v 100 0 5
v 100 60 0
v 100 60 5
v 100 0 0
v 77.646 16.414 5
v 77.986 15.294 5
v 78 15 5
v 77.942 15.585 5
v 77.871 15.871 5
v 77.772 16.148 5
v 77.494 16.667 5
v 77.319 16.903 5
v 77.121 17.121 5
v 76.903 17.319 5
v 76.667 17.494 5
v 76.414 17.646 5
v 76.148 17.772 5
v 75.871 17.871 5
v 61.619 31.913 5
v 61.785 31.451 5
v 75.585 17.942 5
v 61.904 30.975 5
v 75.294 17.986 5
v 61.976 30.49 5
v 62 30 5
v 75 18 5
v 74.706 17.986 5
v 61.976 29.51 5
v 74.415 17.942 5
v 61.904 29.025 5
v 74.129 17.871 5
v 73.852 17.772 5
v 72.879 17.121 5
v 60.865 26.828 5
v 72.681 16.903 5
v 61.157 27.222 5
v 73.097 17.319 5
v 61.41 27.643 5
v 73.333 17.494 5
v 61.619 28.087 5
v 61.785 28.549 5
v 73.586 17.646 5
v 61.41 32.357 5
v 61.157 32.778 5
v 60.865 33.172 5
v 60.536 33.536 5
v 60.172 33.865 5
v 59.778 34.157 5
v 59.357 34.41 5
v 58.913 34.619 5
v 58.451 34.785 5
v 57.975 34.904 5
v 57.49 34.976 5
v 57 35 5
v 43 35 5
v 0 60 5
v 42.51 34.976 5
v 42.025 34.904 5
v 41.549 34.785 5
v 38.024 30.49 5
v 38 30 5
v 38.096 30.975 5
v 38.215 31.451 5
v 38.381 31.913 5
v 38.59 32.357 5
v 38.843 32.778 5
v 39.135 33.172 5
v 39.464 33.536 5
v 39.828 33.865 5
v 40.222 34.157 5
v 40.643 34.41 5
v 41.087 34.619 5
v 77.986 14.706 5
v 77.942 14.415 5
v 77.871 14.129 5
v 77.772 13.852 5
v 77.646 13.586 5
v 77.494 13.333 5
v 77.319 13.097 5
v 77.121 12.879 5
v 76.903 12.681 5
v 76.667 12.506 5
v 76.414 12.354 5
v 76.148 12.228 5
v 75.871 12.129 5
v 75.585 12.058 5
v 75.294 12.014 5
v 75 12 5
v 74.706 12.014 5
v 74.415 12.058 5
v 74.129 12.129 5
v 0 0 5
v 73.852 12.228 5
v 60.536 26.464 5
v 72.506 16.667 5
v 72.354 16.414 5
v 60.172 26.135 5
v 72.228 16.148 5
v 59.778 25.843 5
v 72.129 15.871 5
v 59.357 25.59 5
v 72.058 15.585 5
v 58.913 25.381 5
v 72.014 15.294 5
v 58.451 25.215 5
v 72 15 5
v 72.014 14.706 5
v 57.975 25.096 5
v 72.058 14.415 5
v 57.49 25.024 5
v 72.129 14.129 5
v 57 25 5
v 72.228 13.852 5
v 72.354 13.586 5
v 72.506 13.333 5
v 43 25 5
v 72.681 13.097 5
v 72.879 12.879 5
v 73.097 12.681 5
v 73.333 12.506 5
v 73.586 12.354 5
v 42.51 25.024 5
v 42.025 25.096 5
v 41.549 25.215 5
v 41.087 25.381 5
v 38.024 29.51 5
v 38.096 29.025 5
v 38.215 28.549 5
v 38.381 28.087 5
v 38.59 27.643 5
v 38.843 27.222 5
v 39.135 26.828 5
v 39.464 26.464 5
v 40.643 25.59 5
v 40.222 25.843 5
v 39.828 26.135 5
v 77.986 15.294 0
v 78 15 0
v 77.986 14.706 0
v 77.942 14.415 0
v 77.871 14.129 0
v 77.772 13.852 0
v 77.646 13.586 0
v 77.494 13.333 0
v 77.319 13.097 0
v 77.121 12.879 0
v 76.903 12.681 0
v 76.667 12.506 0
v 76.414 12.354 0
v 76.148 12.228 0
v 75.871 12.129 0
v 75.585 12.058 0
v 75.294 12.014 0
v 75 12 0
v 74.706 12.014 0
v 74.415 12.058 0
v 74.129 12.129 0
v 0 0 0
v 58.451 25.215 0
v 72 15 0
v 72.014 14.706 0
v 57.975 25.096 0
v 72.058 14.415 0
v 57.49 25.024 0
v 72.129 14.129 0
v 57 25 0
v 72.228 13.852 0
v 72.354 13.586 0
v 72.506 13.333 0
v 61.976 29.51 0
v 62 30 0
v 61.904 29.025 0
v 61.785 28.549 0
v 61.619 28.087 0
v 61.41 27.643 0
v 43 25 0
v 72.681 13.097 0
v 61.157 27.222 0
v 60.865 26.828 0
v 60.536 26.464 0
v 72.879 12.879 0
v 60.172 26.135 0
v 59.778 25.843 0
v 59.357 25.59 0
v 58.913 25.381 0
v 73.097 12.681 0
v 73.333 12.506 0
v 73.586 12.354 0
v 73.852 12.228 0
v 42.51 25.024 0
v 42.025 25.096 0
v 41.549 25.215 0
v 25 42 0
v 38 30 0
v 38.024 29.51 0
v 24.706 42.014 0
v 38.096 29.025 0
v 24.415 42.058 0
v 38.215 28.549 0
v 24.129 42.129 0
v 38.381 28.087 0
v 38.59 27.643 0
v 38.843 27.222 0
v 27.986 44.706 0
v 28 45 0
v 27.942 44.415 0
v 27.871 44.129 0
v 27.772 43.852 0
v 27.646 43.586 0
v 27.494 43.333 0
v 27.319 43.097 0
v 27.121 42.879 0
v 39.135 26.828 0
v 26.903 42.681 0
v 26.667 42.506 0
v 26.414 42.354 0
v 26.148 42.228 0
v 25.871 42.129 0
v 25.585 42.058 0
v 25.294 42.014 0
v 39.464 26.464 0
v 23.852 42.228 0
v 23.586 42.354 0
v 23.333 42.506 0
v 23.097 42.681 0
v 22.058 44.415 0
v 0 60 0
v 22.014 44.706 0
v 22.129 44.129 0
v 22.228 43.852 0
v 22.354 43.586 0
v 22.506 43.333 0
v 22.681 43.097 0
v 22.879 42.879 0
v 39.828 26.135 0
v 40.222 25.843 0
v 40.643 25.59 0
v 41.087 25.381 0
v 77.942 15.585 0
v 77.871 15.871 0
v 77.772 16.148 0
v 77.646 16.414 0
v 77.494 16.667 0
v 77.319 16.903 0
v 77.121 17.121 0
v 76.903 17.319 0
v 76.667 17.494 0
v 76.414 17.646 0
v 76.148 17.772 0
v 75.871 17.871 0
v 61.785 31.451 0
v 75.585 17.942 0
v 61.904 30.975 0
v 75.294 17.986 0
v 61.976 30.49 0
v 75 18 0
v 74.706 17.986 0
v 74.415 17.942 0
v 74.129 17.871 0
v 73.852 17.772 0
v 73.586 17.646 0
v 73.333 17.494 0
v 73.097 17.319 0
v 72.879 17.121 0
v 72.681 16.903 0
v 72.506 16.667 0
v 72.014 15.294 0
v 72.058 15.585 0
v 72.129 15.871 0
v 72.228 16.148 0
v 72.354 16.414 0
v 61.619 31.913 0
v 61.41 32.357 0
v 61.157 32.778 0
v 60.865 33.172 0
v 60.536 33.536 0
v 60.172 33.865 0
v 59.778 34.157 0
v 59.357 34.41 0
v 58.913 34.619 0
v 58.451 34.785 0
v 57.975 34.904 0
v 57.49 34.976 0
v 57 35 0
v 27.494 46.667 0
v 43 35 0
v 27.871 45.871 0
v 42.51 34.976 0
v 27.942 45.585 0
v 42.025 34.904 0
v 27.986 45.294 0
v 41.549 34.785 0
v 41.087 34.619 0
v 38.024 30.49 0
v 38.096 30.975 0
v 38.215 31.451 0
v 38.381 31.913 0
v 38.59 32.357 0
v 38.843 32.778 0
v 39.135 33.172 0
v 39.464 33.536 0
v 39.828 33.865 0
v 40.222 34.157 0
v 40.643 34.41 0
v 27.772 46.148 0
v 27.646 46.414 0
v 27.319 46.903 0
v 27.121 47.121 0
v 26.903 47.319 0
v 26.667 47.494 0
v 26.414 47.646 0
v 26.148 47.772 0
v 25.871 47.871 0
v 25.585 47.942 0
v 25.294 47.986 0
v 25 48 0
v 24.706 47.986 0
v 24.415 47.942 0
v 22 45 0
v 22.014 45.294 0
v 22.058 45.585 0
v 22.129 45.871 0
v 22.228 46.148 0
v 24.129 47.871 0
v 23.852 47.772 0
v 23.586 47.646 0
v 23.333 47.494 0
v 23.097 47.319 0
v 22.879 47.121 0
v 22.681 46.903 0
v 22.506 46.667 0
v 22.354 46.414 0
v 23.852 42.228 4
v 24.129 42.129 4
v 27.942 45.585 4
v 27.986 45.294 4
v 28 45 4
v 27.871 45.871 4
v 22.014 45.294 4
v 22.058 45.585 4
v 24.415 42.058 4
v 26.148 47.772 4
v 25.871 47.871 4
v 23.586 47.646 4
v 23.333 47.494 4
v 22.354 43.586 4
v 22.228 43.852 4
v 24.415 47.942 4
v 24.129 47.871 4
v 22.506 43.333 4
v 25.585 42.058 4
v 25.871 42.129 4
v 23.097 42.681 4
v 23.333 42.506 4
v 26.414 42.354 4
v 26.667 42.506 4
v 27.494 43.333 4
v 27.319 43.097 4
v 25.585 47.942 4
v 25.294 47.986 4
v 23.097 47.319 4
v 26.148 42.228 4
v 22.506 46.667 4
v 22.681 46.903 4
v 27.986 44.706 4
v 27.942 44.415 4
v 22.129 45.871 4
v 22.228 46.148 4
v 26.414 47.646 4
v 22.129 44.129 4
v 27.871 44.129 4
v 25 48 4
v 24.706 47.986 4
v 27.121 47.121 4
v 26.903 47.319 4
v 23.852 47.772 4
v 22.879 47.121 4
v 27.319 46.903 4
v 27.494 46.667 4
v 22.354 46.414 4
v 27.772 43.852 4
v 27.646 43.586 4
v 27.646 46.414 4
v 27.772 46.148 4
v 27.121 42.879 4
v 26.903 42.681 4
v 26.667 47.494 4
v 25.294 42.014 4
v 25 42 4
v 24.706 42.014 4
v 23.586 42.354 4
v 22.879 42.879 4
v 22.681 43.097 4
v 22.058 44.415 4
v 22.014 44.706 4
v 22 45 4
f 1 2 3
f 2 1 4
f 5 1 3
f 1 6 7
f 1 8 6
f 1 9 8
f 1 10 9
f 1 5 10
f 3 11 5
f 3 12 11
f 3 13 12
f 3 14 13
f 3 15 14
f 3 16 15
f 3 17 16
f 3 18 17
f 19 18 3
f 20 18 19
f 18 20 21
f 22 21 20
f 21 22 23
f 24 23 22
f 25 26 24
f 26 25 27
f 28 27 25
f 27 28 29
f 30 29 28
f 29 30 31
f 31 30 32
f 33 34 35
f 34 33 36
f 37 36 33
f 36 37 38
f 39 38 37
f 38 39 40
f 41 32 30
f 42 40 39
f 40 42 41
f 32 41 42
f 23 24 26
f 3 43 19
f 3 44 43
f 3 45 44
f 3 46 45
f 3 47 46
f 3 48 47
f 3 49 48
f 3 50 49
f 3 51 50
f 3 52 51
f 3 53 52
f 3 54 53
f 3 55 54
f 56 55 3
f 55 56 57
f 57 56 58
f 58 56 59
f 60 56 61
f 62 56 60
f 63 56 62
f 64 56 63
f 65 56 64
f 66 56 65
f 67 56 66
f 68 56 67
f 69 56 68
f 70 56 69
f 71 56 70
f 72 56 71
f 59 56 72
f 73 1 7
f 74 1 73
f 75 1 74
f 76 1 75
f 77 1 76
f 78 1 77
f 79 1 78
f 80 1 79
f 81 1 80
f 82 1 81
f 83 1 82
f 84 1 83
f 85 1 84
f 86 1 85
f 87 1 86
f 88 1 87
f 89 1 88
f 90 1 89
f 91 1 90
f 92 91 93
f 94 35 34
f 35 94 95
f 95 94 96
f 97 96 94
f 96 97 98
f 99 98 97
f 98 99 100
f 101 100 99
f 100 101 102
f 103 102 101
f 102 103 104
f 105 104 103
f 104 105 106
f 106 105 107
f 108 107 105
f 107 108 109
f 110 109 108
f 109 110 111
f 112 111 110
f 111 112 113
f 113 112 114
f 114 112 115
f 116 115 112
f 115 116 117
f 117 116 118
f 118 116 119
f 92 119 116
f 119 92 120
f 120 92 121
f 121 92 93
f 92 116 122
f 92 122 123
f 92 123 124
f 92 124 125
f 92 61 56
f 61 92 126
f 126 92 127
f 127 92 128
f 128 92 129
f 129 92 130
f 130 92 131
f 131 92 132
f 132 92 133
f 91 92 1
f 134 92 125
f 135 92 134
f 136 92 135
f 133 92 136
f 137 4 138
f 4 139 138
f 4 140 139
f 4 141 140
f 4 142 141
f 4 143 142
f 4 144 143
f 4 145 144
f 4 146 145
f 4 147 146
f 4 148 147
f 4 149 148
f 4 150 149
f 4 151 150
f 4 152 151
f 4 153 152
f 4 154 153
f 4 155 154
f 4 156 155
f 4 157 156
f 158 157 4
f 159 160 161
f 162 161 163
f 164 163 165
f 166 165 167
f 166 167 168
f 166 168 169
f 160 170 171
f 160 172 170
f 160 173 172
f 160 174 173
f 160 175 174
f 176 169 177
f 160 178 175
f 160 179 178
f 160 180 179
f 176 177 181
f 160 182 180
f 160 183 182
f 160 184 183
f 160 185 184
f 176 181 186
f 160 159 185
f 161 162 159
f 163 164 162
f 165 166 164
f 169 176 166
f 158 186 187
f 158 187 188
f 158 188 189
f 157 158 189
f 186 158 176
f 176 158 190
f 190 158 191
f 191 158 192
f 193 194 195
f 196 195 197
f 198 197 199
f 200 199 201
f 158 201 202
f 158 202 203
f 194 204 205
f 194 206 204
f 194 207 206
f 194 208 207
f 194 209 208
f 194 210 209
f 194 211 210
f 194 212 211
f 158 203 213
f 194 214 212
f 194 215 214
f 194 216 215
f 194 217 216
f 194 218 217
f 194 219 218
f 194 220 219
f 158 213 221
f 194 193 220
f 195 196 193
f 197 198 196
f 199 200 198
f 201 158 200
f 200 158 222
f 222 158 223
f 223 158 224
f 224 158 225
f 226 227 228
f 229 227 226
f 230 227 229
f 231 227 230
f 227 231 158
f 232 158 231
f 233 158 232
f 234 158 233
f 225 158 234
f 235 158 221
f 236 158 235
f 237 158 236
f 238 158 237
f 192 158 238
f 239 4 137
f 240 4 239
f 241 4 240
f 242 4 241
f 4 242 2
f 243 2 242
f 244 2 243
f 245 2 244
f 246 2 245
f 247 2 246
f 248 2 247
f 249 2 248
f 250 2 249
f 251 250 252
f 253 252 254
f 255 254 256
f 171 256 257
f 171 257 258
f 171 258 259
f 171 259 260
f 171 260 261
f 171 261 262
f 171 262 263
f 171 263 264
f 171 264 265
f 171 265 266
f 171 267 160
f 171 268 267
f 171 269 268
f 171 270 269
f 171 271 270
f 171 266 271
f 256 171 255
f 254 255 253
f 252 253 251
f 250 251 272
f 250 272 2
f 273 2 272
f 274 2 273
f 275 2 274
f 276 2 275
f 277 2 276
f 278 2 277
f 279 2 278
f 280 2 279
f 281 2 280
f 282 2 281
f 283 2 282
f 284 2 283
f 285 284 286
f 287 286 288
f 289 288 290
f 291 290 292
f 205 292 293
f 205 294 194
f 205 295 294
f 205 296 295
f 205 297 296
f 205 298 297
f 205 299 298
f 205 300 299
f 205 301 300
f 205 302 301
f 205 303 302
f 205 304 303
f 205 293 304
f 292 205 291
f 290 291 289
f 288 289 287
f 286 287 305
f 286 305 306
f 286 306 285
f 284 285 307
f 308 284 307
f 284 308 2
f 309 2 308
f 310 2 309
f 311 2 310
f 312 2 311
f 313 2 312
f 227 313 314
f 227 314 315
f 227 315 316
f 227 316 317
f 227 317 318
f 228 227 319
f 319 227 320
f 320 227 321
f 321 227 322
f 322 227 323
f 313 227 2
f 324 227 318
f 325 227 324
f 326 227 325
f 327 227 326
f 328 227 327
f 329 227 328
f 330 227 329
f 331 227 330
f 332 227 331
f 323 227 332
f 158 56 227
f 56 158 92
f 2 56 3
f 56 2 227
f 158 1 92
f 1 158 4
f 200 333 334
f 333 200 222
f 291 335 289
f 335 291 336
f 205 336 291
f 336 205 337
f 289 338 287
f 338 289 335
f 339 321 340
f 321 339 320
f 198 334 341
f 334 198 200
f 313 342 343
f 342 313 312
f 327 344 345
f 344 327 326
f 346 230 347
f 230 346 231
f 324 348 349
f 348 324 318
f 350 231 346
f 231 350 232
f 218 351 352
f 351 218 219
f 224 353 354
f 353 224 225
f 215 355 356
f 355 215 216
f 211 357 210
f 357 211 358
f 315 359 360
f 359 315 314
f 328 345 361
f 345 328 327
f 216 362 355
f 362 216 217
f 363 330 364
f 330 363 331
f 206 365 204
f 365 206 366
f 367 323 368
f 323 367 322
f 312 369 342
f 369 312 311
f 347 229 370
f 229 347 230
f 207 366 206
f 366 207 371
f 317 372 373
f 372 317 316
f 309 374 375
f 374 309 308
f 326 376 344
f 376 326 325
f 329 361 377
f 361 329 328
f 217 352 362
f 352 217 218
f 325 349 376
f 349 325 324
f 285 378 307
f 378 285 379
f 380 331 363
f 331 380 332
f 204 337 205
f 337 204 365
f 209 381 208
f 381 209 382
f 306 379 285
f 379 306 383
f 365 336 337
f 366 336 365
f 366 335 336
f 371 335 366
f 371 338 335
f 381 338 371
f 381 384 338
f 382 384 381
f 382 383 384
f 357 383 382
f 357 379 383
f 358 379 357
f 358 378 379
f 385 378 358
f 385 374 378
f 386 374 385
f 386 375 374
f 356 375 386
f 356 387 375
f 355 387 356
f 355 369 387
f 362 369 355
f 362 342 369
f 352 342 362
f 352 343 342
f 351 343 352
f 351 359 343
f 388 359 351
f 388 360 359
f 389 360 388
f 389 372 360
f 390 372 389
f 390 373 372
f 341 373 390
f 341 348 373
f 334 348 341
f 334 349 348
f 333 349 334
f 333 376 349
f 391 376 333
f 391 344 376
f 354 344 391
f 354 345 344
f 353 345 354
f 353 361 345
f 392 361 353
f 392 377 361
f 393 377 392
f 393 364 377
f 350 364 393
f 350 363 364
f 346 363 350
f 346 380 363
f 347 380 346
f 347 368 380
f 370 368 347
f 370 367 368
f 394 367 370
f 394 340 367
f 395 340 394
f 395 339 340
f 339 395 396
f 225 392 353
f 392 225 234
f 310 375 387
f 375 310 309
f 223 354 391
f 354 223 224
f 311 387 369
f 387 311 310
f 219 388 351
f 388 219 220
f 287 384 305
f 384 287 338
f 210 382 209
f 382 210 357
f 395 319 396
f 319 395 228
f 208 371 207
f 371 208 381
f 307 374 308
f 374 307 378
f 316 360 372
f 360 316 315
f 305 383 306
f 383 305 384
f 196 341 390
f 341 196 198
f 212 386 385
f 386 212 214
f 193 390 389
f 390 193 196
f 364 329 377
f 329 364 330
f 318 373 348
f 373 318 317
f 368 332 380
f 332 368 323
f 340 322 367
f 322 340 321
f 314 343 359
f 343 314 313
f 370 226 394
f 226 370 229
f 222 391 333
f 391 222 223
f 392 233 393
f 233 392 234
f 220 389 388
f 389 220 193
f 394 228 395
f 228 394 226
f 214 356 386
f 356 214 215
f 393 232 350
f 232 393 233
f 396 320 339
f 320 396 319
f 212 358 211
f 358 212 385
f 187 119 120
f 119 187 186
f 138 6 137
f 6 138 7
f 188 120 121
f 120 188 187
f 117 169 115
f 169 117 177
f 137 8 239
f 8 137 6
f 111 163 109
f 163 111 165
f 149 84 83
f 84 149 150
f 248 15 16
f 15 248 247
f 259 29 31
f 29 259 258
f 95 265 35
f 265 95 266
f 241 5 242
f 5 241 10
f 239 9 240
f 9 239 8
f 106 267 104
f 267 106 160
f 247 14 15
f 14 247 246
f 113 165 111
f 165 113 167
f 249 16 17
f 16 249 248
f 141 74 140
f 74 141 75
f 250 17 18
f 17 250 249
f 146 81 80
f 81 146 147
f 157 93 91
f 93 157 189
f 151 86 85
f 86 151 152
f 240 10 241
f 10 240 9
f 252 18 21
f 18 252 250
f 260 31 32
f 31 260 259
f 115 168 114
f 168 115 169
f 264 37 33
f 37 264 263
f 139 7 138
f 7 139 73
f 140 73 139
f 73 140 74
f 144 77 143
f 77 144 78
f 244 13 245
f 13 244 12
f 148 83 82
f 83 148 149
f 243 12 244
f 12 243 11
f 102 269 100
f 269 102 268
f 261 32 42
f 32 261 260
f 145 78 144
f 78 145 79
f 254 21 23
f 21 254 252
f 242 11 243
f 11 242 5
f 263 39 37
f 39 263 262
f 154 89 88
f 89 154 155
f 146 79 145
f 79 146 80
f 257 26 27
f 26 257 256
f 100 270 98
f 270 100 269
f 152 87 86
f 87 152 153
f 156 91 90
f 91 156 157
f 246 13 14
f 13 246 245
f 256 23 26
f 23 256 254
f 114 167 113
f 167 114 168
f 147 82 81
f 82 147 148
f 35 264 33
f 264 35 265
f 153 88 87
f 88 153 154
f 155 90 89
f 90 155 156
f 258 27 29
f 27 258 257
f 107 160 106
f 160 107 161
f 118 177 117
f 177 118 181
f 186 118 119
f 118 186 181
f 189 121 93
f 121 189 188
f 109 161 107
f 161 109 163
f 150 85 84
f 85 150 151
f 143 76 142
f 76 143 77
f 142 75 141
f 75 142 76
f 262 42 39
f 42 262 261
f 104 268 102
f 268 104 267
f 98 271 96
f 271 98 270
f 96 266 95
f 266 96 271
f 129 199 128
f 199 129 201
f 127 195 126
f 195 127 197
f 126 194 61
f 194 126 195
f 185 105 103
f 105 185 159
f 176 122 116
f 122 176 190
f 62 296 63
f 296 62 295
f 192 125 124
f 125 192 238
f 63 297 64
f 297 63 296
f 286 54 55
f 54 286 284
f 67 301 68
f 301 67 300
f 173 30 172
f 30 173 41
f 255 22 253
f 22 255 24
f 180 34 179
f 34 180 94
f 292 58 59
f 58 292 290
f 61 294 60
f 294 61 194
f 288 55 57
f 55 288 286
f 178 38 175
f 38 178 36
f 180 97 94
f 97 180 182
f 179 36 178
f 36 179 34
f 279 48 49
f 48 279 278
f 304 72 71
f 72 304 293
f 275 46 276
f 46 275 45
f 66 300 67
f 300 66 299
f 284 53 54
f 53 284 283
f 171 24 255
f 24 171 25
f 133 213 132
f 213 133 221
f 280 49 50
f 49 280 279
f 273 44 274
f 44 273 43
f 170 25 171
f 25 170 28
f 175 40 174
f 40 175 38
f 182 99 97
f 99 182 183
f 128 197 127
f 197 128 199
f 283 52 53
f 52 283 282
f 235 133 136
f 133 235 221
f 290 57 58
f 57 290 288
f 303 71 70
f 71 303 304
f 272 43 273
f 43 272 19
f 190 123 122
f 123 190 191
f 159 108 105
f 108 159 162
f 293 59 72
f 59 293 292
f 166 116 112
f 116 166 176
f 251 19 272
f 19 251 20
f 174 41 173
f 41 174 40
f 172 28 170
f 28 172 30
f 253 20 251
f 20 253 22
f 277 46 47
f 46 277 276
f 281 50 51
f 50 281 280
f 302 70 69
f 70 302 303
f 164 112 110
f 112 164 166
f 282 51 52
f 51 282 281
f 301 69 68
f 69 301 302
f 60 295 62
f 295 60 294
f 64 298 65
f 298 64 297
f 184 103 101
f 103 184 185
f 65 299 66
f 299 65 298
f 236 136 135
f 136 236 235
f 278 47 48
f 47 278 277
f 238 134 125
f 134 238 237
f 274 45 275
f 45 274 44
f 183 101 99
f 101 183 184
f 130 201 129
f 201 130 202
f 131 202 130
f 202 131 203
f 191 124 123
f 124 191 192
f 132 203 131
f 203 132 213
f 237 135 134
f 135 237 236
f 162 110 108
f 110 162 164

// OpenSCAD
// fixture D3 (planted defect): the top-left through-hole made BLIND (4 mm
// of 5 mm depth — a 1 mm floor remains).
// declared detector: genus (3 -> 2: the tunnel closes)
// must remain stable: build_success, extents, volume (+113 mm3 = 0.4% < 2%)
$fn = 64;
difference() {
  cube([100, 60, 5]);
  translate([25, 45, 0]) cylinder(d = 6, h = 4);     // blind pocket
  translate([75, 15, -1]) cylinder(d = 6, h = 7);
  translate([50, 30, -1])
    linear_extrude(height = 7)
      hull() {
        translate([-(24 - 10) / 2, 0]) circle(d = 10);
        translate([(24 - 10) / 2, 0]) circle(d = 10);
      }
}
